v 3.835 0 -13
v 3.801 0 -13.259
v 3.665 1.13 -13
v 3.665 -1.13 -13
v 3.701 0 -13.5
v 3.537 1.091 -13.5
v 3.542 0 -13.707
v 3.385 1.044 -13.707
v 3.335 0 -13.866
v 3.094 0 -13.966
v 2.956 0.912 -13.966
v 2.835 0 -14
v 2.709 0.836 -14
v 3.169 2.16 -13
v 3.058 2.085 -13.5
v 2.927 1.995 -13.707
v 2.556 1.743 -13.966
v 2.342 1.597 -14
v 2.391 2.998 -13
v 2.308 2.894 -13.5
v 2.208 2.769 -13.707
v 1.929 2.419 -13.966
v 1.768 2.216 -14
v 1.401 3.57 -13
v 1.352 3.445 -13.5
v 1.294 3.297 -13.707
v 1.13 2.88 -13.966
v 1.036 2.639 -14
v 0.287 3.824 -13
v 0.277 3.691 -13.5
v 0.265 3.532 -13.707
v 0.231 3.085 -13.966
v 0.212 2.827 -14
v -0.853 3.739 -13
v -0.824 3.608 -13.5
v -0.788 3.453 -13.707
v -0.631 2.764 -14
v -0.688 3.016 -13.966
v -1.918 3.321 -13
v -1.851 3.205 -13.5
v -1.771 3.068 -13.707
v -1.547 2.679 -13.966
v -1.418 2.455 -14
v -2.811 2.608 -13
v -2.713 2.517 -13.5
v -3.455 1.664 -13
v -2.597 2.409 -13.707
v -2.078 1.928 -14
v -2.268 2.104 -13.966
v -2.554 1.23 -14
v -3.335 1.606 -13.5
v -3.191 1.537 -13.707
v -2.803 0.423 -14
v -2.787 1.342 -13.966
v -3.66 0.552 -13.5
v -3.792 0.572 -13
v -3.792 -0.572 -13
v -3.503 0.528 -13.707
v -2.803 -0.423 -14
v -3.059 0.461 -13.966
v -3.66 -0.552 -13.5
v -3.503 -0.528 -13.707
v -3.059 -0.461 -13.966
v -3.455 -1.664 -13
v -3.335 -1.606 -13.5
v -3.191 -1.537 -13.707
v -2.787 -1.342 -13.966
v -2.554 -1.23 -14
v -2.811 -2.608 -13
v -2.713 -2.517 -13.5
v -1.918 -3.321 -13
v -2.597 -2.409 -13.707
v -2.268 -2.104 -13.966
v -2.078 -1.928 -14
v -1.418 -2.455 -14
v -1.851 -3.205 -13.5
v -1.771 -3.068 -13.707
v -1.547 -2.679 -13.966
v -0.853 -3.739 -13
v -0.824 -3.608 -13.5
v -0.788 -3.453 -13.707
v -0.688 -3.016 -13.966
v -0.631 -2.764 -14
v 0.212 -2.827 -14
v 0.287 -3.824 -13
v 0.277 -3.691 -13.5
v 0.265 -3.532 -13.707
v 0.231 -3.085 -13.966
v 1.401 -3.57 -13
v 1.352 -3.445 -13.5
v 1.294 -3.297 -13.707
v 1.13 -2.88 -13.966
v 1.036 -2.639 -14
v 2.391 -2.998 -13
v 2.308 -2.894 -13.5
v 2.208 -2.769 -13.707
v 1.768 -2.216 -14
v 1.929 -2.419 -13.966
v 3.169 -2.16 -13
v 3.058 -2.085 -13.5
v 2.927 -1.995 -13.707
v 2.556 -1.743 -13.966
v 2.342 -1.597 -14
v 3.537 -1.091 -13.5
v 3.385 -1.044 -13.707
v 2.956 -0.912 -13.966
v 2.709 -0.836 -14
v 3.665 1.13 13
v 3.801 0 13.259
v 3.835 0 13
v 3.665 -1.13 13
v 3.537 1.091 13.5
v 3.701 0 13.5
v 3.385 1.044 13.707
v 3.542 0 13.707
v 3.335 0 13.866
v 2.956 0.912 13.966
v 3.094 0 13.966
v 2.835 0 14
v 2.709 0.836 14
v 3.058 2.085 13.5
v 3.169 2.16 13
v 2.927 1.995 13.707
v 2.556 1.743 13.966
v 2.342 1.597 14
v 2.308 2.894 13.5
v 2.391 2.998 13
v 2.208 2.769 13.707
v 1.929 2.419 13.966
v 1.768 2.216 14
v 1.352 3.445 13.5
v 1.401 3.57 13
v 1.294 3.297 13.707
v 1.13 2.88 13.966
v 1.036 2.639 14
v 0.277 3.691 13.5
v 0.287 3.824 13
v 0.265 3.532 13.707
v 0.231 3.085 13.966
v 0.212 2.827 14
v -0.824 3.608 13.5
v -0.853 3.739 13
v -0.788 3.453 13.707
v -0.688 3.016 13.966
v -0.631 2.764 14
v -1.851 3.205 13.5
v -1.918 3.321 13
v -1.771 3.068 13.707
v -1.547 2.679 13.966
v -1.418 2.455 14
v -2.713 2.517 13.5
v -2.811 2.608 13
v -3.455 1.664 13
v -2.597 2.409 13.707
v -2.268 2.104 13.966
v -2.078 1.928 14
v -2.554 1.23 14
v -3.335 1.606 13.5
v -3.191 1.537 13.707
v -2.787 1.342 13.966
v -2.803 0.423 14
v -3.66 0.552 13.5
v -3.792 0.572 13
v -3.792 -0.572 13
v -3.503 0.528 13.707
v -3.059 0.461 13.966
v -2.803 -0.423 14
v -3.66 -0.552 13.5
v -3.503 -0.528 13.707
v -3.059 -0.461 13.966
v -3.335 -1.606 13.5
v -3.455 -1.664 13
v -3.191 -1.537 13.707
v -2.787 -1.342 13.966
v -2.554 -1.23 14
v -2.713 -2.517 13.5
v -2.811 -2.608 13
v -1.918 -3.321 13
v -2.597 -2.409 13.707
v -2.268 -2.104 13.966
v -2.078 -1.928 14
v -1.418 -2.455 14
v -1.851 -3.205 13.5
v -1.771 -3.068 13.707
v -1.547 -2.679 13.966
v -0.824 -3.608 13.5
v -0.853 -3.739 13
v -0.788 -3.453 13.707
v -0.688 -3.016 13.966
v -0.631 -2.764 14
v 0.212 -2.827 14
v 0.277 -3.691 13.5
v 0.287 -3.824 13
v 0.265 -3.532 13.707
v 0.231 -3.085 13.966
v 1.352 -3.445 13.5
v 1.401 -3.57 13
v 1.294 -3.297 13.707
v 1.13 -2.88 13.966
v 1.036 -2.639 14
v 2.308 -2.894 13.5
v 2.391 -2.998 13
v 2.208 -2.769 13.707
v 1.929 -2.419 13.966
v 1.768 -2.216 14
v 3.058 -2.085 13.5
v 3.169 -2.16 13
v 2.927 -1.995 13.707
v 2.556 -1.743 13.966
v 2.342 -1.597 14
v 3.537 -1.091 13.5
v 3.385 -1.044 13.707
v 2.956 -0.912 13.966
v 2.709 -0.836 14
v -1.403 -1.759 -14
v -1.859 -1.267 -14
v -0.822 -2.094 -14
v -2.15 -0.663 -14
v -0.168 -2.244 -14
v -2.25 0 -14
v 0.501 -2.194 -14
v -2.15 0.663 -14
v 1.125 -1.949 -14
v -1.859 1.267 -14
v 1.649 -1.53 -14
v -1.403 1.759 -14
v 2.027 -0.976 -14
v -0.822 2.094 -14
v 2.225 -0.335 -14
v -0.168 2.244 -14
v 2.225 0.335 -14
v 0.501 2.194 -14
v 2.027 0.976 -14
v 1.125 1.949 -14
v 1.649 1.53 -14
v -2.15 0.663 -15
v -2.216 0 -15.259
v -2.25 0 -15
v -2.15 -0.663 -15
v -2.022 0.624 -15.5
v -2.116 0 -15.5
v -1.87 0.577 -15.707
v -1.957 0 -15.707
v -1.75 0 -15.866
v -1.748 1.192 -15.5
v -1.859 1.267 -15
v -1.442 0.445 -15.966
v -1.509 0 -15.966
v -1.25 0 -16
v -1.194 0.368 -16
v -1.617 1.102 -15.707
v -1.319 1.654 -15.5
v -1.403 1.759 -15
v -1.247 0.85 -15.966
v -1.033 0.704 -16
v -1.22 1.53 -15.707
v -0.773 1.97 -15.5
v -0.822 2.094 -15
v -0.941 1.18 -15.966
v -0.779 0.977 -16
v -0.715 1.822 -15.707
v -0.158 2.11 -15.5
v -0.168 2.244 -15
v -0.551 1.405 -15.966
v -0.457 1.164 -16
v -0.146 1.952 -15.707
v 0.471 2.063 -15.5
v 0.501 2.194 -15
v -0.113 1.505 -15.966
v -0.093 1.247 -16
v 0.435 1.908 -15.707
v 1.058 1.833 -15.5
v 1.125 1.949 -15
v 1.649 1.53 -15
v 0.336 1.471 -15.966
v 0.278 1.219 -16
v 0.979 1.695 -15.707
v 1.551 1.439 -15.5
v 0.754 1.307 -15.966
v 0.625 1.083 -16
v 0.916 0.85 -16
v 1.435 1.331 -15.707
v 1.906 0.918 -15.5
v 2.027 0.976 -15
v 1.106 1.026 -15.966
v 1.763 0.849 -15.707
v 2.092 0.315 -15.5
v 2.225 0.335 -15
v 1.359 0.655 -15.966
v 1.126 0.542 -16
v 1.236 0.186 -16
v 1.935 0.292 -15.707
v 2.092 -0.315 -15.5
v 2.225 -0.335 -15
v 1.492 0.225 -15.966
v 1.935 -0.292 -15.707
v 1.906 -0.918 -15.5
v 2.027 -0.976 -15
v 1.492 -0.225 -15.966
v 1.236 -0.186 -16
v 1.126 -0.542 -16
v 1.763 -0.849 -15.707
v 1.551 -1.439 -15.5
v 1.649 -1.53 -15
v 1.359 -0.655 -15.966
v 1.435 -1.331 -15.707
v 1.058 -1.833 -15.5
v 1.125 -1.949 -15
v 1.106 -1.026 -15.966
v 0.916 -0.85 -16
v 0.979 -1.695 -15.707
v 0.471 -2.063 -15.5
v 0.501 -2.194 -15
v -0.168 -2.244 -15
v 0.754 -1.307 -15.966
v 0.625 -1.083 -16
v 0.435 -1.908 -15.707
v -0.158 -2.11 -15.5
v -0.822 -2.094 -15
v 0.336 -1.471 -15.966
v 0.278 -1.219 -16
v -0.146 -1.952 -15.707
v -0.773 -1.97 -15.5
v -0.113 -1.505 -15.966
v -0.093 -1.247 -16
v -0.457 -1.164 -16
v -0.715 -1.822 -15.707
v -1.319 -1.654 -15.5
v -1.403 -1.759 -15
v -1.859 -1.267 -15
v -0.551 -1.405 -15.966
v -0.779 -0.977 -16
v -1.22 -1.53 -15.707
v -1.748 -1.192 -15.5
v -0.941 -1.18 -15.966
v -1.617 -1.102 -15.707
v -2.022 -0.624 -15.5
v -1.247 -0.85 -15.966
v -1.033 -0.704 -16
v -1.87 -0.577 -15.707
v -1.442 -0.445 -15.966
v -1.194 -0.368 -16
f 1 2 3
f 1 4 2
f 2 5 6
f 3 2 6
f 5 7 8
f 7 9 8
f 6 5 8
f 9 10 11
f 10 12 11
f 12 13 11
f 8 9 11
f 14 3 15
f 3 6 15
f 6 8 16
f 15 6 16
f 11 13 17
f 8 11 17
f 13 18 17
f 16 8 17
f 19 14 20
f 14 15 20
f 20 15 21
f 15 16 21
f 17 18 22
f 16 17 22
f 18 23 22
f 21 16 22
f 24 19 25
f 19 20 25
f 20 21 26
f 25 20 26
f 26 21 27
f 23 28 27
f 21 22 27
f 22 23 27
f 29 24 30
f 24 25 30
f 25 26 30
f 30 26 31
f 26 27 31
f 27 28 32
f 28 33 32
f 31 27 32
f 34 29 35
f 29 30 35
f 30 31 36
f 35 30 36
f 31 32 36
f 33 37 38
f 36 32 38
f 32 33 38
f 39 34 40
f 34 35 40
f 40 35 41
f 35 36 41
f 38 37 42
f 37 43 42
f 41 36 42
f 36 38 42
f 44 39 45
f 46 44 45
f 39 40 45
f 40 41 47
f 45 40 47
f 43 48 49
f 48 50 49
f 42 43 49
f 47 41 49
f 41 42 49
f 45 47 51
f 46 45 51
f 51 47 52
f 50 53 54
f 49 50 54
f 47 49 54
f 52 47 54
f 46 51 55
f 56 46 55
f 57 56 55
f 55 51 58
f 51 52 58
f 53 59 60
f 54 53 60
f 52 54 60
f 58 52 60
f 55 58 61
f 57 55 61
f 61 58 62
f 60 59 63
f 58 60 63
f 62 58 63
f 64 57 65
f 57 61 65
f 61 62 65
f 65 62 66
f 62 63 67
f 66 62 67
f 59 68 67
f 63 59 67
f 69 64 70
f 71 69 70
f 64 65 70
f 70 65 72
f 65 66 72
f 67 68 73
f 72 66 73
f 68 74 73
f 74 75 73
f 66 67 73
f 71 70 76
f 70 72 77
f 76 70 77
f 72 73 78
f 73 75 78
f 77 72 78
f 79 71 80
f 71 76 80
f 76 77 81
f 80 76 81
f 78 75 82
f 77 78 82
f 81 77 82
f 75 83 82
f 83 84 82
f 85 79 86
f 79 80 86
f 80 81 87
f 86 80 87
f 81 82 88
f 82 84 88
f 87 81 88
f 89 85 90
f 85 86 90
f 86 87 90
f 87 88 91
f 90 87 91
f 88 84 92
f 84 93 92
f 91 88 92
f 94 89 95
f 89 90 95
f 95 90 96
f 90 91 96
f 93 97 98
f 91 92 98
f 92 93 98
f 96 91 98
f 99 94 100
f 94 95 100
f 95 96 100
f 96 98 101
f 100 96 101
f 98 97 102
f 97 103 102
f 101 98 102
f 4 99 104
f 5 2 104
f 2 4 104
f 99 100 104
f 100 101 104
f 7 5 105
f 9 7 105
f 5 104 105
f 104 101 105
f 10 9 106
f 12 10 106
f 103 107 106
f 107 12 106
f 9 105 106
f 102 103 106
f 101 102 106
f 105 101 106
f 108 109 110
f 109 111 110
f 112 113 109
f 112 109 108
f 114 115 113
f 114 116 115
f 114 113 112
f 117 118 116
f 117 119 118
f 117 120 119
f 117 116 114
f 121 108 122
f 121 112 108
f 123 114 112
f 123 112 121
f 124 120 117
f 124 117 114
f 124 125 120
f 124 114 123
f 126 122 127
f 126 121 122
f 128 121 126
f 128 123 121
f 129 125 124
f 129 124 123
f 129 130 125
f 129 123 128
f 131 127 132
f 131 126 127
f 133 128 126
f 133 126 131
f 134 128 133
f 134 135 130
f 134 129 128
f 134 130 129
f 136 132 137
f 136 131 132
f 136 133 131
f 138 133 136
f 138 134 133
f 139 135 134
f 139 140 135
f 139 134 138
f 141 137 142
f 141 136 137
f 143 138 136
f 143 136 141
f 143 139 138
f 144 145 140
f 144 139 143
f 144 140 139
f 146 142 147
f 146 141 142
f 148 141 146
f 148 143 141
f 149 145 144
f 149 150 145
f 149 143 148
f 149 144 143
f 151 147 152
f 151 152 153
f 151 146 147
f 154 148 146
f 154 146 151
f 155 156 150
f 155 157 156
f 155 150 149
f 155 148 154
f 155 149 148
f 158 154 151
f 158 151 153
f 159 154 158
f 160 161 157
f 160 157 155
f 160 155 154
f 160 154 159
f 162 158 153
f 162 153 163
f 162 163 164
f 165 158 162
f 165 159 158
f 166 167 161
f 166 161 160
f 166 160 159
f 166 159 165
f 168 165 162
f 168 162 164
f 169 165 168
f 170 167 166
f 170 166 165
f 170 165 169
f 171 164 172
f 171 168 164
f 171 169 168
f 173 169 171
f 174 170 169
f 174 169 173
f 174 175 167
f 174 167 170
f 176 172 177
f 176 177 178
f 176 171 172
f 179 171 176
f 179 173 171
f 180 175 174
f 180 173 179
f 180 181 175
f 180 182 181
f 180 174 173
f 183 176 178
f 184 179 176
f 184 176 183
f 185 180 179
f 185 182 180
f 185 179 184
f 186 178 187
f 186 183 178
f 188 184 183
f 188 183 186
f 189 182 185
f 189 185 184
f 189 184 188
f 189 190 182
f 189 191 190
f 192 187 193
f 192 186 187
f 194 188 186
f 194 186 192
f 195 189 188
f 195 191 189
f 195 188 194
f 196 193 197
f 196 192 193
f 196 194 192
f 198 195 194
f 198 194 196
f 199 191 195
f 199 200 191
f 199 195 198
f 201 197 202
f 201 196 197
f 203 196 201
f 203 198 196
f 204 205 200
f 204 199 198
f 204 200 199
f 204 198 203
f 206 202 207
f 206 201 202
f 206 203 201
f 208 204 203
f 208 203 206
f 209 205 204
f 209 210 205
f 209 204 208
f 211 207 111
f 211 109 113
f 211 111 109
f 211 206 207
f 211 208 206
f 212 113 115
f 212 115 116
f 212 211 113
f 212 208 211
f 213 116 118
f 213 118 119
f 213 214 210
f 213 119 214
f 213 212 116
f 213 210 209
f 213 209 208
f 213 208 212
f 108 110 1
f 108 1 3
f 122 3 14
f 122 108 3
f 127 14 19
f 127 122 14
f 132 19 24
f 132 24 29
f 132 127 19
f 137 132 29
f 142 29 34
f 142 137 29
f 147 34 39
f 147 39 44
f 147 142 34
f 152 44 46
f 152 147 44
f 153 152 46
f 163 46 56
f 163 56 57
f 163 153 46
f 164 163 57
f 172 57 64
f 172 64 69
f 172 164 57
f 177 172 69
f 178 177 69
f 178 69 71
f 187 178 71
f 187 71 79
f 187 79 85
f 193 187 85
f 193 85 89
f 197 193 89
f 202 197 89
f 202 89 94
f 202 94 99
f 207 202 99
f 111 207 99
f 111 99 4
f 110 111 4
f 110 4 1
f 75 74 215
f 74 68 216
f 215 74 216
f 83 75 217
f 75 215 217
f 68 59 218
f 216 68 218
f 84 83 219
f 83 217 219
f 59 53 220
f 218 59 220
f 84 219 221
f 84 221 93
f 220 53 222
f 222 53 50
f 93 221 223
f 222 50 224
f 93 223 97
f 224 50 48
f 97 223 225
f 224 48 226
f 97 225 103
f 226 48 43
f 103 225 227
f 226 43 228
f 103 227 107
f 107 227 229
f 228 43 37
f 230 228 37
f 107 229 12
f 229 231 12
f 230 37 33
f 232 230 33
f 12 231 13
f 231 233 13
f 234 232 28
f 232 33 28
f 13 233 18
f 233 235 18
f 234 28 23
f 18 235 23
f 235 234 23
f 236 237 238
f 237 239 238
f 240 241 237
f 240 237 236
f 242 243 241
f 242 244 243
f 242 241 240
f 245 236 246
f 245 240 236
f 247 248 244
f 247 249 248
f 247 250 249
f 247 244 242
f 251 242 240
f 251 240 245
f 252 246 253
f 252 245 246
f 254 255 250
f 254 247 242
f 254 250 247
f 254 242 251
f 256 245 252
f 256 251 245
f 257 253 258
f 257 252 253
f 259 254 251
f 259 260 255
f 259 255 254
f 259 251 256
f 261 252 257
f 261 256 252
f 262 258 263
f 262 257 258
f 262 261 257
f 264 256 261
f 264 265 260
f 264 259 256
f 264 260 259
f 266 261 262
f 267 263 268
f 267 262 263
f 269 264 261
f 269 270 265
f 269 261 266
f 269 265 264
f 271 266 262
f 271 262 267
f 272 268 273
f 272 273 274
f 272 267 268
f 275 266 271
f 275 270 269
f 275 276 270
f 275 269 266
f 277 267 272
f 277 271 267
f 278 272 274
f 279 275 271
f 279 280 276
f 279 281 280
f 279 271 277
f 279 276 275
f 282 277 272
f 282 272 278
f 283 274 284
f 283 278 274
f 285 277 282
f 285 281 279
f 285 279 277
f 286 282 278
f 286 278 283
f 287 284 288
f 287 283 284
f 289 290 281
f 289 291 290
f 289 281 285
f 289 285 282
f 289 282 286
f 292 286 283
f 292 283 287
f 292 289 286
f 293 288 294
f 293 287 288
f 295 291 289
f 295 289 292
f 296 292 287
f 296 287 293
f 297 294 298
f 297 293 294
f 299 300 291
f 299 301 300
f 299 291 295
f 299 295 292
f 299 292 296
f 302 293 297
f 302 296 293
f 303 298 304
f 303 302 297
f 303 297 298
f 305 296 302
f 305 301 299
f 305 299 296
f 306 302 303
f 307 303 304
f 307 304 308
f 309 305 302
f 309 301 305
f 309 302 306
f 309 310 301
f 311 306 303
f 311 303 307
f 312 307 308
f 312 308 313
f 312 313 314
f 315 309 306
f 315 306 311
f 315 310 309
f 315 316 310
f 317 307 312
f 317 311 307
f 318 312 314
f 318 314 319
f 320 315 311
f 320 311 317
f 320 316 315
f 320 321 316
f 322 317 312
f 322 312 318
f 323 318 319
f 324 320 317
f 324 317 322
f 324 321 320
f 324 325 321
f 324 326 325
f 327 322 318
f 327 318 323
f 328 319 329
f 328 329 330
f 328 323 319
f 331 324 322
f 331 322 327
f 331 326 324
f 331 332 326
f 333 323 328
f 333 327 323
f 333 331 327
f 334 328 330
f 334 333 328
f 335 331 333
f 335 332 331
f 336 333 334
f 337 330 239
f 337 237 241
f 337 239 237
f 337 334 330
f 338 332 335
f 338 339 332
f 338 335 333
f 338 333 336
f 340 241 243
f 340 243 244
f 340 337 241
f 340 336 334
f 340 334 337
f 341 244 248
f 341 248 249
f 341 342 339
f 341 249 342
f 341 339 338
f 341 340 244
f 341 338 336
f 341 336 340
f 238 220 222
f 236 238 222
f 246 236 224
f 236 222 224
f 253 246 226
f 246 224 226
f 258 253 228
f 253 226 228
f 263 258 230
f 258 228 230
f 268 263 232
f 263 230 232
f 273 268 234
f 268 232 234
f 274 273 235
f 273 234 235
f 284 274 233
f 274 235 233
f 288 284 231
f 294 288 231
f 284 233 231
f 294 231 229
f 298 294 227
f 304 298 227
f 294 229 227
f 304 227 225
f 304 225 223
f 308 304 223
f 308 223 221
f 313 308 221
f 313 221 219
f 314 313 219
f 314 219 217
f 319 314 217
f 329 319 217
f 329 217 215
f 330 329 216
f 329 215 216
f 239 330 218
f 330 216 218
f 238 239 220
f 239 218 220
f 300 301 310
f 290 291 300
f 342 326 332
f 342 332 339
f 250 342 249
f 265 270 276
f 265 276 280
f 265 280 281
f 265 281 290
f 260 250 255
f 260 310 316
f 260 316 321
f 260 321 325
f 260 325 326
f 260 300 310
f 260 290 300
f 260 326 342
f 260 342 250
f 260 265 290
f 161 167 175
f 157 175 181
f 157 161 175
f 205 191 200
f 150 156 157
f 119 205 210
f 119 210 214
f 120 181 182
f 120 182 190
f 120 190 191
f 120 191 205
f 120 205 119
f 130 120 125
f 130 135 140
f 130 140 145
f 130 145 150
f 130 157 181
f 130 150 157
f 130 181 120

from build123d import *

# Parameters (mm, degrees)
SKETCH1_R           = 3.835
BOSS_EXTRUDE1_DEPTH = 14
SKETCH2_R           = 2.25
BOSS_EXTRUDE2_DEPTH = 2
FILLET1_R           = 1


with BuildPart() as part:
    # Sketch1 → Boss-Extrude1 (new, symmetric)
    with BuildSketch(Plane.XY):
        Circle(SKETCH1_R)
    extrude(amount=BOSS_EXTRUDE1_DEPTH, both=True)

    # Sketch2 → Boss-Extrude2 (add)
    with BuildSketch(Plane(origin=(0, 0, -14), x_dir=(-1, 0, 0), z_dir=(0, 0, -1))):
        Circle(SKETCH2_R)
    extrude(amount=BOSS_EXTRUDE2_DEPTH)

    # Fillet1
    fillet1_edges = [part.edges().sort_by_distance(p)[0] for p in [
        (-3.835, 0, -14),
        (-3.835, 0, 14),
        (2.25, 0, -16),
    ]]
    fillet(fillet1_edges, radius=FILLET1_R)


solid = part.part
